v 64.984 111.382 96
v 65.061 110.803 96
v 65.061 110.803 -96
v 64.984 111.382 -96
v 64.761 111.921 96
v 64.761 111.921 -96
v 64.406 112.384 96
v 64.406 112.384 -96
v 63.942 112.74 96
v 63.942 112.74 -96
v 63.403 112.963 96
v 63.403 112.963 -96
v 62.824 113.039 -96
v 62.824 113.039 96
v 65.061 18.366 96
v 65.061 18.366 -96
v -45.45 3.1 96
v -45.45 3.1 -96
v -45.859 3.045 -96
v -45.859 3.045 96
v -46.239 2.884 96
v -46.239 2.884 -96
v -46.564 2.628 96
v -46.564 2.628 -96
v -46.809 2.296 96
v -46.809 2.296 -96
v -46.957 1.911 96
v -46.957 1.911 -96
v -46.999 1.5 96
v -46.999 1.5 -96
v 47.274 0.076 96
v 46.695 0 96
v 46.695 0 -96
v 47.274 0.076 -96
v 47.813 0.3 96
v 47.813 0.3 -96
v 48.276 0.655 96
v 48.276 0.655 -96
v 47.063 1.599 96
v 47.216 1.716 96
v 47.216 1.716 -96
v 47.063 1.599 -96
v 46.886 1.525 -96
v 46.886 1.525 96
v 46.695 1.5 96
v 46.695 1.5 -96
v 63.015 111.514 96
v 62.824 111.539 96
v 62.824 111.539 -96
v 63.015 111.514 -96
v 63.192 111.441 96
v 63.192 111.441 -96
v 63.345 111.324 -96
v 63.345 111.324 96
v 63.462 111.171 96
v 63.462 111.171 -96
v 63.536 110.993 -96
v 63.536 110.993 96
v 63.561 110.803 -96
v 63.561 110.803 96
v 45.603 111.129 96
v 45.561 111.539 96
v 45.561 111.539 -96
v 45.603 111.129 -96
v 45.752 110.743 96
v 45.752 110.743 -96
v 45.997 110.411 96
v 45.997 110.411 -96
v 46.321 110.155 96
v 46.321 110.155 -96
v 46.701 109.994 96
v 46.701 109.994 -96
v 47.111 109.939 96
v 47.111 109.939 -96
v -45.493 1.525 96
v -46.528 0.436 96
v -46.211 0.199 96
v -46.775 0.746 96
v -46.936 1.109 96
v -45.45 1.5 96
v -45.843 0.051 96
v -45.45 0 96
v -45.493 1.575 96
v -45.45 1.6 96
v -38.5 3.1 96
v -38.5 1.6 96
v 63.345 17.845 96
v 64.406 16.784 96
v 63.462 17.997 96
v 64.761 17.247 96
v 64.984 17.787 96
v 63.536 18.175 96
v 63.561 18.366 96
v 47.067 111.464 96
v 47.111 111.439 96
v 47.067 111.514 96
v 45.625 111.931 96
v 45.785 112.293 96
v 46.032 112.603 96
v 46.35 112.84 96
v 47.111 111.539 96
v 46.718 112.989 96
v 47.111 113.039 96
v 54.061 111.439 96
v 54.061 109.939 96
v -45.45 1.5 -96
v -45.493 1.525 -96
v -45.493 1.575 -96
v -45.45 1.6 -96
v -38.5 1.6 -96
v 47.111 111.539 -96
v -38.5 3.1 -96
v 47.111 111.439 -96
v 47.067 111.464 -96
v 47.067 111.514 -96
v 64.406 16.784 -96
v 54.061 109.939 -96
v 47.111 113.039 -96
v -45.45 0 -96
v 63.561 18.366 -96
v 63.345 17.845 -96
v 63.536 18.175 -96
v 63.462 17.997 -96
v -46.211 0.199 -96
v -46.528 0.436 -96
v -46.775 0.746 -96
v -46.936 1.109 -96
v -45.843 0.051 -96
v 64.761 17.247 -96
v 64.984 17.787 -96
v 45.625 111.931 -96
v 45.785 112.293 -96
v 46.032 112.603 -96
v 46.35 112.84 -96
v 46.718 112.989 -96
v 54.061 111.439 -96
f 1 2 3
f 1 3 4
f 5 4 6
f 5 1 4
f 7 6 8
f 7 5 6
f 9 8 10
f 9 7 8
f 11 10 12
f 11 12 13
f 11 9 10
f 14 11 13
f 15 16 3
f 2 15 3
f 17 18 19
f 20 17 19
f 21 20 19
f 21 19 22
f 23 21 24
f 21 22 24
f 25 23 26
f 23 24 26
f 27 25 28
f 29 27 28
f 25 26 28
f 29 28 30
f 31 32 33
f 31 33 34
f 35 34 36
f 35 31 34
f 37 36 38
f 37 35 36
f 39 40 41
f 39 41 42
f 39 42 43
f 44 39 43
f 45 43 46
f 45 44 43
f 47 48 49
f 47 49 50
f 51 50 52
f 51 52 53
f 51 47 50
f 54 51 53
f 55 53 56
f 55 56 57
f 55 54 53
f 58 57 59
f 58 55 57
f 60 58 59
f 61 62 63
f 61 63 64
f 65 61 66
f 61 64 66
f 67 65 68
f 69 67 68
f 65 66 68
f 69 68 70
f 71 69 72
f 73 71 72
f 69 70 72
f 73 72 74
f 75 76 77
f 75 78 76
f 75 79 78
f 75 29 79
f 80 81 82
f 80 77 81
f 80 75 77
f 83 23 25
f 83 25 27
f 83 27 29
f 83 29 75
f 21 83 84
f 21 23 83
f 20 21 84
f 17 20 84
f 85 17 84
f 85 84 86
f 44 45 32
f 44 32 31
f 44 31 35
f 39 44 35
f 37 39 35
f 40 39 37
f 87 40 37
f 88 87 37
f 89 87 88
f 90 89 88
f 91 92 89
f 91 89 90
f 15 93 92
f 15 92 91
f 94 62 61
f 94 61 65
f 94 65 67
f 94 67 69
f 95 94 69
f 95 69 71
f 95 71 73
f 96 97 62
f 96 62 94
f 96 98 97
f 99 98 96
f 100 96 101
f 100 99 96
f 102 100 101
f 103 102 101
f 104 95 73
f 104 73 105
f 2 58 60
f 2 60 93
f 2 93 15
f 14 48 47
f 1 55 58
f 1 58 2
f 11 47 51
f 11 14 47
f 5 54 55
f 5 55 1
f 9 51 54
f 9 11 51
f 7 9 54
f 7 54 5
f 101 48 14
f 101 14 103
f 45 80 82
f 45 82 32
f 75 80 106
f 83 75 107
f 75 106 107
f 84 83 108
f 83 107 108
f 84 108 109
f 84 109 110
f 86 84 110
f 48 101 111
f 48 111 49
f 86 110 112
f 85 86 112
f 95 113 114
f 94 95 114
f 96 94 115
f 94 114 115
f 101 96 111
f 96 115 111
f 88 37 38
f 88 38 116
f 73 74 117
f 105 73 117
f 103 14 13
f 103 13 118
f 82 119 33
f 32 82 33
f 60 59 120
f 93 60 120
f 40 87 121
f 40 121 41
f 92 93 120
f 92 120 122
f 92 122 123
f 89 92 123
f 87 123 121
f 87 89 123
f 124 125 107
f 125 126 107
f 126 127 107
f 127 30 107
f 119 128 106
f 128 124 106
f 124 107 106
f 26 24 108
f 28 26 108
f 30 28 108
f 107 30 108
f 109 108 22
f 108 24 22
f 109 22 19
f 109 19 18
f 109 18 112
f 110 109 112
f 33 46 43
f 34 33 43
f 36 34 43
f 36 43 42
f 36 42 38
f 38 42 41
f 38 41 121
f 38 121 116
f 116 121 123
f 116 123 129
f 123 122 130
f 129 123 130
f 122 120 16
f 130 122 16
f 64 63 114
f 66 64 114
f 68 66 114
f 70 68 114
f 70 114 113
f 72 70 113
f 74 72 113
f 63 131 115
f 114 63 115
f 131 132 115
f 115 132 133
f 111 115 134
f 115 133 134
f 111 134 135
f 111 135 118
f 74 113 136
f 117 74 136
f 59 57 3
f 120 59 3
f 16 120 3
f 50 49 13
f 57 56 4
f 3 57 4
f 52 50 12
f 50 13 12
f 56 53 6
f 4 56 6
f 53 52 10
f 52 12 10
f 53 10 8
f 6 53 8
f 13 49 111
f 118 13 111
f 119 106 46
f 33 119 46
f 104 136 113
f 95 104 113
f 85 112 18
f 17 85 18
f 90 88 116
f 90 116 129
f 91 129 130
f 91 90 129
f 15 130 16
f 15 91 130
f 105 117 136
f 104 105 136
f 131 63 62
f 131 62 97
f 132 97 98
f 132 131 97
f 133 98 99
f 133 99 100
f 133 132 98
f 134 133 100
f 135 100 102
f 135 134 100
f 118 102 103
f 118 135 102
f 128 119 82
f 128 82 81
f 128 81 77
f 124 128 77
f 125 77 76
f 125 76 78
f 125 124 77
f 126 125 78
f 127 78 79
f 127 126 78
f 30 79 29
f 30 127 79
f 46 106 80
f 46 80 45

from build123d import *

# Parameters (mm, degrees)
CROQUIS1_W                       = 94
CROQUIS1_H                       = 192
BRIDA_BASE1_DEPTH                = 1.5
BRIDA_DE_ARISTA1_STRIP_CUT_DEPTH = 192
BRIDA_DE_ARISTA1_DEPTH           = 192
BRIDA_DE_ARISTA3_STRIP_CUT_DEPTH = 192
BRIDA_DE_ARISTA3_DEPTH           = 192
BRIDA_DE_ARISTA4_STRIP_W         = 7.4732
BRIDA_DE_ARISTA4_STRIP_H         = 1.5
BRIDA_DE_ARISTA4_STRIP_CUT_DEPTH = 192
BRIDA_DE_ARISTA4_DEPTH           = 192
DOBLADILLO1_START                = -96
DOBLADILLO1_DEPTH                = 192
DOBLADILLO1_2_DEPTH              = 192


# Read off the part's stored shape, not the designer's step: Dobladillo1
# Sheet-metal steps are written as plain solids
with BuildPart() as part:
    # Croquis1 → Brida base1 (new body)
    with BuildSketch(Plane(origin=(0, 0, 0), x_dir=(1, 0, 0), z_dir=(0, 1, 0))):
        Rectangle(CROQUIS1_W, CROQUIS1_H)
    extrude(amount=BRIDA_BASE1_DEPTH)

    # Brida de arista1 strip (across the edge) → Brida de arista1 strip cut (cut)
    with BuildSketch(Plane(origin=(47, 1.5, 96), x_dir=(-0.7071067811865438, 0.7071067811865512, 0), z_dir=(0, 0, -1))):
        Polygon((-6.129265424, 4.00794508), (-0.844915027, -1.276405317), (0.215745145, -0.215745145), (-5.068605252, 5.068605252), align=None)
    extrude(amount=BRIDA_DE_ARISTA1_STRIP_CUT_DEPTH, mode=Mode.SUBTRACT)

    # Brida de arista1 section (across the edge) → Brida de arista1 (add)
    with BuildSketch(Plane(origin=(47, 1.5, 96), x_dir=(-0.7071067811865438, 0.7071067811865512, 0), z_dir=(0, 0, -1))):
        with BuildLine():
            Line((-1.5, 0.30510971), (-1.5, 23.420310217))
            Line((-1.5, 23.420310217), (0, 23.420310217))
            Line((0, 23.420310217), (0, 0.30510971))
            ThreePointArc((0, 0.30510971), (0.056070336, 0.023225094), (0.215745145, -0.215745145))
            Line((0.215745145, -0.215745145), (-0.844915027, -1.276405317))
            ThreePointArc((-0.844915027, -1.276405317), (-1.329748962, -0.550800055), (-1.5, 0.30510971))
        make_face()
    extrude(amount=BRIDA_DE_ARISTA1_DEPTH)

    # Brida de arista3 strip (across the edge) → Brida de arista3 strip cut (cut)
    with BuildSketch(Plane(origin=(63.560660172, 18.060660172, 96), x_dir=(-1, 0, 0), z_dir=(0, 0, -1))):
        Polygon((-6.129265424, 4.00794508), (-0.844915027, -1.276405317), (0.215745145, -0.215745145), (-5.068605252, 5.068605252), align=None)
    extrude(amount=BRIDA_DE_ARISTA3_STRIP_CUT_DEPTH, mode=Mode.SUBTRACT)

    # Brida de arista3 section (across the edge) → Brida de arista3 (add)
    with BuildSketch(Plane(origin=(63.560660172, 18.060660172, 96), x_dir=(-1, 0, 0), z_dir=(0, 0, -1))):
        with BuildLine():
            Line((-1.5, 0.30510971), (-1.5, 94.978679656))
            Line((-1.5, 94.978679656), (0, 94.978679656))
            Line((0, 94.978679656), (0, 0.30510971))
            ThreePointArc((0, 0.30510971), (0.056070336, 0.023225094), (0.215745145, -0.215745145))
            Line((0.215745145, -0.215745145), (-0.844915027, -1.276405317))
            ThreePointArc((-0.844915027, -1.276405317), (-1.329748962, -0.550800055), (-1.5, 0.30510971))
        make_face()
    extrude(amount=BRIDA_DE_ARISTA3_DEPTH)

    # Brida de arista4 strip (across the edge) → Brida de arista4 strip cut (cut)
    with BuildSketch(Plane(origin=(63.560660172, 113.039339828, 96), x_dir=(0, -1, 0), z_dir=(0, 0, -1))):
        with Locations((-1.5, -0.75)):
            Rectangle(BRIDA_DE_ARISTA4_STRIP_W, BRIDA_DE_ARISTA4_STRIP_H)
    extrude(amount=BRIDA_DE_ARISTA4_STRIP_CUT_DEPTH, mode=Mode.SUBTRACT)

    # Brida de arista4 section (across the edge) → Brida de arista4 (add)
    with BuildSketch(Plane(origin=(63.560660172, 113.039339828, 96), x_dir=(0, -1, 0), z_dir=(0, 0, -1))):
        with BuildLine():
            Line((0, 0.7366), (0, 18))
            Line((0, 18), (1.5, 18))
            Line((1.5, 18), (1.5, 0.7366))
            ThreePointArc((1.5, 0.7366), (1.715745145, 0.215745145), (2.2366, 0))
            Line((2.2366, 0), (2.2366, -1.5))
            ThreePointArc((2.2366, -1.5), (0.655084973, -0.844915027), (0, 0.7366))
        make_face()
    extrude(amount=BRIDA_DE_ARISTA4_DEPTH)

    # Dobladillo1 outline → Dobladillo1 (cut)
    with BuildSketch(Plane.XY.offset(DOBLADILLO1_START)):
        with BuildLine():
            Line((45.560660172, 111.539339828), (45.561466834, 111.539339828))
            ThreePointArc((45.561466834, 111.539339828), (46.032467239, 112.602892701), (47.110660172, 113.039339828))
            Line((47.110660172, 113.039339828), (45.560660172, 113.039339828))
            Line((45.560660172, 113.039339828), (45.560660172, 111.539339828))
        make_face()
        with BuildLine():
            ThreePointArc((-45.45, 0), (-46.528192933, 0.436447127), (-46.999193338, 1.5))
            Line((-46.999193338, 1.5), (-47, 1.5))
            Line((-47, 1.5), (-47, 0))
            Line((-47, 0), (-45.45, 0))
        make_face()
    extrude(amount=DOBLADILLO1_DEPTH, mode=Mode.SUBTRACT)

    # Dobladillo1 2 outline → Dobladillo1 2 (add)
    with BuildSketch(Plane.XY.offset(DOBLADILLO1_START)):
        with BuildLine():
            Line((54.060660172, 109.939339828), (54.060660172, 111.439339828))
            Line((54.060660172, 111.439339828), (47.110660172, 111.439339828))
            ThreePointArc((47.110660172, 111.439339828), (47.060660172, 111.489339828), (47.110660172, 111.539339828))
            Line((47.110660172, 111.539339828), (45.561466834, 111.539339828))
            ThreePointArc((45.561466834, 111.539339828), (45.997107299, 110.411146895), (47.110660172, 109.939339828))
            Line((47.110660172, 109.939339828), (54.060660172, 109.939339828))
        make_face()
        with BuildLine():
            Line((-38.5, 1.6), (-38.5, 3.1))
            Line((-38.5, 3.1), (-45.45, 3.1))
            ThreePointArc((-45.45, 3.1), (-46.563552873, 2.628192933), (-46.999193338, 1.5))
            Line((-46.999193338, 1.5), (-45.45, 1.5))
            ThreePointArc((-45.45, 1.5), (-45.5, 1.55), (-45.45, 1.6))
            Line((-45.45, 1.6), (-38.5, 1.6))
        make_face()
    extrude(amount=DOBLADILLO1_2_DEPTH)


solid = part.part
